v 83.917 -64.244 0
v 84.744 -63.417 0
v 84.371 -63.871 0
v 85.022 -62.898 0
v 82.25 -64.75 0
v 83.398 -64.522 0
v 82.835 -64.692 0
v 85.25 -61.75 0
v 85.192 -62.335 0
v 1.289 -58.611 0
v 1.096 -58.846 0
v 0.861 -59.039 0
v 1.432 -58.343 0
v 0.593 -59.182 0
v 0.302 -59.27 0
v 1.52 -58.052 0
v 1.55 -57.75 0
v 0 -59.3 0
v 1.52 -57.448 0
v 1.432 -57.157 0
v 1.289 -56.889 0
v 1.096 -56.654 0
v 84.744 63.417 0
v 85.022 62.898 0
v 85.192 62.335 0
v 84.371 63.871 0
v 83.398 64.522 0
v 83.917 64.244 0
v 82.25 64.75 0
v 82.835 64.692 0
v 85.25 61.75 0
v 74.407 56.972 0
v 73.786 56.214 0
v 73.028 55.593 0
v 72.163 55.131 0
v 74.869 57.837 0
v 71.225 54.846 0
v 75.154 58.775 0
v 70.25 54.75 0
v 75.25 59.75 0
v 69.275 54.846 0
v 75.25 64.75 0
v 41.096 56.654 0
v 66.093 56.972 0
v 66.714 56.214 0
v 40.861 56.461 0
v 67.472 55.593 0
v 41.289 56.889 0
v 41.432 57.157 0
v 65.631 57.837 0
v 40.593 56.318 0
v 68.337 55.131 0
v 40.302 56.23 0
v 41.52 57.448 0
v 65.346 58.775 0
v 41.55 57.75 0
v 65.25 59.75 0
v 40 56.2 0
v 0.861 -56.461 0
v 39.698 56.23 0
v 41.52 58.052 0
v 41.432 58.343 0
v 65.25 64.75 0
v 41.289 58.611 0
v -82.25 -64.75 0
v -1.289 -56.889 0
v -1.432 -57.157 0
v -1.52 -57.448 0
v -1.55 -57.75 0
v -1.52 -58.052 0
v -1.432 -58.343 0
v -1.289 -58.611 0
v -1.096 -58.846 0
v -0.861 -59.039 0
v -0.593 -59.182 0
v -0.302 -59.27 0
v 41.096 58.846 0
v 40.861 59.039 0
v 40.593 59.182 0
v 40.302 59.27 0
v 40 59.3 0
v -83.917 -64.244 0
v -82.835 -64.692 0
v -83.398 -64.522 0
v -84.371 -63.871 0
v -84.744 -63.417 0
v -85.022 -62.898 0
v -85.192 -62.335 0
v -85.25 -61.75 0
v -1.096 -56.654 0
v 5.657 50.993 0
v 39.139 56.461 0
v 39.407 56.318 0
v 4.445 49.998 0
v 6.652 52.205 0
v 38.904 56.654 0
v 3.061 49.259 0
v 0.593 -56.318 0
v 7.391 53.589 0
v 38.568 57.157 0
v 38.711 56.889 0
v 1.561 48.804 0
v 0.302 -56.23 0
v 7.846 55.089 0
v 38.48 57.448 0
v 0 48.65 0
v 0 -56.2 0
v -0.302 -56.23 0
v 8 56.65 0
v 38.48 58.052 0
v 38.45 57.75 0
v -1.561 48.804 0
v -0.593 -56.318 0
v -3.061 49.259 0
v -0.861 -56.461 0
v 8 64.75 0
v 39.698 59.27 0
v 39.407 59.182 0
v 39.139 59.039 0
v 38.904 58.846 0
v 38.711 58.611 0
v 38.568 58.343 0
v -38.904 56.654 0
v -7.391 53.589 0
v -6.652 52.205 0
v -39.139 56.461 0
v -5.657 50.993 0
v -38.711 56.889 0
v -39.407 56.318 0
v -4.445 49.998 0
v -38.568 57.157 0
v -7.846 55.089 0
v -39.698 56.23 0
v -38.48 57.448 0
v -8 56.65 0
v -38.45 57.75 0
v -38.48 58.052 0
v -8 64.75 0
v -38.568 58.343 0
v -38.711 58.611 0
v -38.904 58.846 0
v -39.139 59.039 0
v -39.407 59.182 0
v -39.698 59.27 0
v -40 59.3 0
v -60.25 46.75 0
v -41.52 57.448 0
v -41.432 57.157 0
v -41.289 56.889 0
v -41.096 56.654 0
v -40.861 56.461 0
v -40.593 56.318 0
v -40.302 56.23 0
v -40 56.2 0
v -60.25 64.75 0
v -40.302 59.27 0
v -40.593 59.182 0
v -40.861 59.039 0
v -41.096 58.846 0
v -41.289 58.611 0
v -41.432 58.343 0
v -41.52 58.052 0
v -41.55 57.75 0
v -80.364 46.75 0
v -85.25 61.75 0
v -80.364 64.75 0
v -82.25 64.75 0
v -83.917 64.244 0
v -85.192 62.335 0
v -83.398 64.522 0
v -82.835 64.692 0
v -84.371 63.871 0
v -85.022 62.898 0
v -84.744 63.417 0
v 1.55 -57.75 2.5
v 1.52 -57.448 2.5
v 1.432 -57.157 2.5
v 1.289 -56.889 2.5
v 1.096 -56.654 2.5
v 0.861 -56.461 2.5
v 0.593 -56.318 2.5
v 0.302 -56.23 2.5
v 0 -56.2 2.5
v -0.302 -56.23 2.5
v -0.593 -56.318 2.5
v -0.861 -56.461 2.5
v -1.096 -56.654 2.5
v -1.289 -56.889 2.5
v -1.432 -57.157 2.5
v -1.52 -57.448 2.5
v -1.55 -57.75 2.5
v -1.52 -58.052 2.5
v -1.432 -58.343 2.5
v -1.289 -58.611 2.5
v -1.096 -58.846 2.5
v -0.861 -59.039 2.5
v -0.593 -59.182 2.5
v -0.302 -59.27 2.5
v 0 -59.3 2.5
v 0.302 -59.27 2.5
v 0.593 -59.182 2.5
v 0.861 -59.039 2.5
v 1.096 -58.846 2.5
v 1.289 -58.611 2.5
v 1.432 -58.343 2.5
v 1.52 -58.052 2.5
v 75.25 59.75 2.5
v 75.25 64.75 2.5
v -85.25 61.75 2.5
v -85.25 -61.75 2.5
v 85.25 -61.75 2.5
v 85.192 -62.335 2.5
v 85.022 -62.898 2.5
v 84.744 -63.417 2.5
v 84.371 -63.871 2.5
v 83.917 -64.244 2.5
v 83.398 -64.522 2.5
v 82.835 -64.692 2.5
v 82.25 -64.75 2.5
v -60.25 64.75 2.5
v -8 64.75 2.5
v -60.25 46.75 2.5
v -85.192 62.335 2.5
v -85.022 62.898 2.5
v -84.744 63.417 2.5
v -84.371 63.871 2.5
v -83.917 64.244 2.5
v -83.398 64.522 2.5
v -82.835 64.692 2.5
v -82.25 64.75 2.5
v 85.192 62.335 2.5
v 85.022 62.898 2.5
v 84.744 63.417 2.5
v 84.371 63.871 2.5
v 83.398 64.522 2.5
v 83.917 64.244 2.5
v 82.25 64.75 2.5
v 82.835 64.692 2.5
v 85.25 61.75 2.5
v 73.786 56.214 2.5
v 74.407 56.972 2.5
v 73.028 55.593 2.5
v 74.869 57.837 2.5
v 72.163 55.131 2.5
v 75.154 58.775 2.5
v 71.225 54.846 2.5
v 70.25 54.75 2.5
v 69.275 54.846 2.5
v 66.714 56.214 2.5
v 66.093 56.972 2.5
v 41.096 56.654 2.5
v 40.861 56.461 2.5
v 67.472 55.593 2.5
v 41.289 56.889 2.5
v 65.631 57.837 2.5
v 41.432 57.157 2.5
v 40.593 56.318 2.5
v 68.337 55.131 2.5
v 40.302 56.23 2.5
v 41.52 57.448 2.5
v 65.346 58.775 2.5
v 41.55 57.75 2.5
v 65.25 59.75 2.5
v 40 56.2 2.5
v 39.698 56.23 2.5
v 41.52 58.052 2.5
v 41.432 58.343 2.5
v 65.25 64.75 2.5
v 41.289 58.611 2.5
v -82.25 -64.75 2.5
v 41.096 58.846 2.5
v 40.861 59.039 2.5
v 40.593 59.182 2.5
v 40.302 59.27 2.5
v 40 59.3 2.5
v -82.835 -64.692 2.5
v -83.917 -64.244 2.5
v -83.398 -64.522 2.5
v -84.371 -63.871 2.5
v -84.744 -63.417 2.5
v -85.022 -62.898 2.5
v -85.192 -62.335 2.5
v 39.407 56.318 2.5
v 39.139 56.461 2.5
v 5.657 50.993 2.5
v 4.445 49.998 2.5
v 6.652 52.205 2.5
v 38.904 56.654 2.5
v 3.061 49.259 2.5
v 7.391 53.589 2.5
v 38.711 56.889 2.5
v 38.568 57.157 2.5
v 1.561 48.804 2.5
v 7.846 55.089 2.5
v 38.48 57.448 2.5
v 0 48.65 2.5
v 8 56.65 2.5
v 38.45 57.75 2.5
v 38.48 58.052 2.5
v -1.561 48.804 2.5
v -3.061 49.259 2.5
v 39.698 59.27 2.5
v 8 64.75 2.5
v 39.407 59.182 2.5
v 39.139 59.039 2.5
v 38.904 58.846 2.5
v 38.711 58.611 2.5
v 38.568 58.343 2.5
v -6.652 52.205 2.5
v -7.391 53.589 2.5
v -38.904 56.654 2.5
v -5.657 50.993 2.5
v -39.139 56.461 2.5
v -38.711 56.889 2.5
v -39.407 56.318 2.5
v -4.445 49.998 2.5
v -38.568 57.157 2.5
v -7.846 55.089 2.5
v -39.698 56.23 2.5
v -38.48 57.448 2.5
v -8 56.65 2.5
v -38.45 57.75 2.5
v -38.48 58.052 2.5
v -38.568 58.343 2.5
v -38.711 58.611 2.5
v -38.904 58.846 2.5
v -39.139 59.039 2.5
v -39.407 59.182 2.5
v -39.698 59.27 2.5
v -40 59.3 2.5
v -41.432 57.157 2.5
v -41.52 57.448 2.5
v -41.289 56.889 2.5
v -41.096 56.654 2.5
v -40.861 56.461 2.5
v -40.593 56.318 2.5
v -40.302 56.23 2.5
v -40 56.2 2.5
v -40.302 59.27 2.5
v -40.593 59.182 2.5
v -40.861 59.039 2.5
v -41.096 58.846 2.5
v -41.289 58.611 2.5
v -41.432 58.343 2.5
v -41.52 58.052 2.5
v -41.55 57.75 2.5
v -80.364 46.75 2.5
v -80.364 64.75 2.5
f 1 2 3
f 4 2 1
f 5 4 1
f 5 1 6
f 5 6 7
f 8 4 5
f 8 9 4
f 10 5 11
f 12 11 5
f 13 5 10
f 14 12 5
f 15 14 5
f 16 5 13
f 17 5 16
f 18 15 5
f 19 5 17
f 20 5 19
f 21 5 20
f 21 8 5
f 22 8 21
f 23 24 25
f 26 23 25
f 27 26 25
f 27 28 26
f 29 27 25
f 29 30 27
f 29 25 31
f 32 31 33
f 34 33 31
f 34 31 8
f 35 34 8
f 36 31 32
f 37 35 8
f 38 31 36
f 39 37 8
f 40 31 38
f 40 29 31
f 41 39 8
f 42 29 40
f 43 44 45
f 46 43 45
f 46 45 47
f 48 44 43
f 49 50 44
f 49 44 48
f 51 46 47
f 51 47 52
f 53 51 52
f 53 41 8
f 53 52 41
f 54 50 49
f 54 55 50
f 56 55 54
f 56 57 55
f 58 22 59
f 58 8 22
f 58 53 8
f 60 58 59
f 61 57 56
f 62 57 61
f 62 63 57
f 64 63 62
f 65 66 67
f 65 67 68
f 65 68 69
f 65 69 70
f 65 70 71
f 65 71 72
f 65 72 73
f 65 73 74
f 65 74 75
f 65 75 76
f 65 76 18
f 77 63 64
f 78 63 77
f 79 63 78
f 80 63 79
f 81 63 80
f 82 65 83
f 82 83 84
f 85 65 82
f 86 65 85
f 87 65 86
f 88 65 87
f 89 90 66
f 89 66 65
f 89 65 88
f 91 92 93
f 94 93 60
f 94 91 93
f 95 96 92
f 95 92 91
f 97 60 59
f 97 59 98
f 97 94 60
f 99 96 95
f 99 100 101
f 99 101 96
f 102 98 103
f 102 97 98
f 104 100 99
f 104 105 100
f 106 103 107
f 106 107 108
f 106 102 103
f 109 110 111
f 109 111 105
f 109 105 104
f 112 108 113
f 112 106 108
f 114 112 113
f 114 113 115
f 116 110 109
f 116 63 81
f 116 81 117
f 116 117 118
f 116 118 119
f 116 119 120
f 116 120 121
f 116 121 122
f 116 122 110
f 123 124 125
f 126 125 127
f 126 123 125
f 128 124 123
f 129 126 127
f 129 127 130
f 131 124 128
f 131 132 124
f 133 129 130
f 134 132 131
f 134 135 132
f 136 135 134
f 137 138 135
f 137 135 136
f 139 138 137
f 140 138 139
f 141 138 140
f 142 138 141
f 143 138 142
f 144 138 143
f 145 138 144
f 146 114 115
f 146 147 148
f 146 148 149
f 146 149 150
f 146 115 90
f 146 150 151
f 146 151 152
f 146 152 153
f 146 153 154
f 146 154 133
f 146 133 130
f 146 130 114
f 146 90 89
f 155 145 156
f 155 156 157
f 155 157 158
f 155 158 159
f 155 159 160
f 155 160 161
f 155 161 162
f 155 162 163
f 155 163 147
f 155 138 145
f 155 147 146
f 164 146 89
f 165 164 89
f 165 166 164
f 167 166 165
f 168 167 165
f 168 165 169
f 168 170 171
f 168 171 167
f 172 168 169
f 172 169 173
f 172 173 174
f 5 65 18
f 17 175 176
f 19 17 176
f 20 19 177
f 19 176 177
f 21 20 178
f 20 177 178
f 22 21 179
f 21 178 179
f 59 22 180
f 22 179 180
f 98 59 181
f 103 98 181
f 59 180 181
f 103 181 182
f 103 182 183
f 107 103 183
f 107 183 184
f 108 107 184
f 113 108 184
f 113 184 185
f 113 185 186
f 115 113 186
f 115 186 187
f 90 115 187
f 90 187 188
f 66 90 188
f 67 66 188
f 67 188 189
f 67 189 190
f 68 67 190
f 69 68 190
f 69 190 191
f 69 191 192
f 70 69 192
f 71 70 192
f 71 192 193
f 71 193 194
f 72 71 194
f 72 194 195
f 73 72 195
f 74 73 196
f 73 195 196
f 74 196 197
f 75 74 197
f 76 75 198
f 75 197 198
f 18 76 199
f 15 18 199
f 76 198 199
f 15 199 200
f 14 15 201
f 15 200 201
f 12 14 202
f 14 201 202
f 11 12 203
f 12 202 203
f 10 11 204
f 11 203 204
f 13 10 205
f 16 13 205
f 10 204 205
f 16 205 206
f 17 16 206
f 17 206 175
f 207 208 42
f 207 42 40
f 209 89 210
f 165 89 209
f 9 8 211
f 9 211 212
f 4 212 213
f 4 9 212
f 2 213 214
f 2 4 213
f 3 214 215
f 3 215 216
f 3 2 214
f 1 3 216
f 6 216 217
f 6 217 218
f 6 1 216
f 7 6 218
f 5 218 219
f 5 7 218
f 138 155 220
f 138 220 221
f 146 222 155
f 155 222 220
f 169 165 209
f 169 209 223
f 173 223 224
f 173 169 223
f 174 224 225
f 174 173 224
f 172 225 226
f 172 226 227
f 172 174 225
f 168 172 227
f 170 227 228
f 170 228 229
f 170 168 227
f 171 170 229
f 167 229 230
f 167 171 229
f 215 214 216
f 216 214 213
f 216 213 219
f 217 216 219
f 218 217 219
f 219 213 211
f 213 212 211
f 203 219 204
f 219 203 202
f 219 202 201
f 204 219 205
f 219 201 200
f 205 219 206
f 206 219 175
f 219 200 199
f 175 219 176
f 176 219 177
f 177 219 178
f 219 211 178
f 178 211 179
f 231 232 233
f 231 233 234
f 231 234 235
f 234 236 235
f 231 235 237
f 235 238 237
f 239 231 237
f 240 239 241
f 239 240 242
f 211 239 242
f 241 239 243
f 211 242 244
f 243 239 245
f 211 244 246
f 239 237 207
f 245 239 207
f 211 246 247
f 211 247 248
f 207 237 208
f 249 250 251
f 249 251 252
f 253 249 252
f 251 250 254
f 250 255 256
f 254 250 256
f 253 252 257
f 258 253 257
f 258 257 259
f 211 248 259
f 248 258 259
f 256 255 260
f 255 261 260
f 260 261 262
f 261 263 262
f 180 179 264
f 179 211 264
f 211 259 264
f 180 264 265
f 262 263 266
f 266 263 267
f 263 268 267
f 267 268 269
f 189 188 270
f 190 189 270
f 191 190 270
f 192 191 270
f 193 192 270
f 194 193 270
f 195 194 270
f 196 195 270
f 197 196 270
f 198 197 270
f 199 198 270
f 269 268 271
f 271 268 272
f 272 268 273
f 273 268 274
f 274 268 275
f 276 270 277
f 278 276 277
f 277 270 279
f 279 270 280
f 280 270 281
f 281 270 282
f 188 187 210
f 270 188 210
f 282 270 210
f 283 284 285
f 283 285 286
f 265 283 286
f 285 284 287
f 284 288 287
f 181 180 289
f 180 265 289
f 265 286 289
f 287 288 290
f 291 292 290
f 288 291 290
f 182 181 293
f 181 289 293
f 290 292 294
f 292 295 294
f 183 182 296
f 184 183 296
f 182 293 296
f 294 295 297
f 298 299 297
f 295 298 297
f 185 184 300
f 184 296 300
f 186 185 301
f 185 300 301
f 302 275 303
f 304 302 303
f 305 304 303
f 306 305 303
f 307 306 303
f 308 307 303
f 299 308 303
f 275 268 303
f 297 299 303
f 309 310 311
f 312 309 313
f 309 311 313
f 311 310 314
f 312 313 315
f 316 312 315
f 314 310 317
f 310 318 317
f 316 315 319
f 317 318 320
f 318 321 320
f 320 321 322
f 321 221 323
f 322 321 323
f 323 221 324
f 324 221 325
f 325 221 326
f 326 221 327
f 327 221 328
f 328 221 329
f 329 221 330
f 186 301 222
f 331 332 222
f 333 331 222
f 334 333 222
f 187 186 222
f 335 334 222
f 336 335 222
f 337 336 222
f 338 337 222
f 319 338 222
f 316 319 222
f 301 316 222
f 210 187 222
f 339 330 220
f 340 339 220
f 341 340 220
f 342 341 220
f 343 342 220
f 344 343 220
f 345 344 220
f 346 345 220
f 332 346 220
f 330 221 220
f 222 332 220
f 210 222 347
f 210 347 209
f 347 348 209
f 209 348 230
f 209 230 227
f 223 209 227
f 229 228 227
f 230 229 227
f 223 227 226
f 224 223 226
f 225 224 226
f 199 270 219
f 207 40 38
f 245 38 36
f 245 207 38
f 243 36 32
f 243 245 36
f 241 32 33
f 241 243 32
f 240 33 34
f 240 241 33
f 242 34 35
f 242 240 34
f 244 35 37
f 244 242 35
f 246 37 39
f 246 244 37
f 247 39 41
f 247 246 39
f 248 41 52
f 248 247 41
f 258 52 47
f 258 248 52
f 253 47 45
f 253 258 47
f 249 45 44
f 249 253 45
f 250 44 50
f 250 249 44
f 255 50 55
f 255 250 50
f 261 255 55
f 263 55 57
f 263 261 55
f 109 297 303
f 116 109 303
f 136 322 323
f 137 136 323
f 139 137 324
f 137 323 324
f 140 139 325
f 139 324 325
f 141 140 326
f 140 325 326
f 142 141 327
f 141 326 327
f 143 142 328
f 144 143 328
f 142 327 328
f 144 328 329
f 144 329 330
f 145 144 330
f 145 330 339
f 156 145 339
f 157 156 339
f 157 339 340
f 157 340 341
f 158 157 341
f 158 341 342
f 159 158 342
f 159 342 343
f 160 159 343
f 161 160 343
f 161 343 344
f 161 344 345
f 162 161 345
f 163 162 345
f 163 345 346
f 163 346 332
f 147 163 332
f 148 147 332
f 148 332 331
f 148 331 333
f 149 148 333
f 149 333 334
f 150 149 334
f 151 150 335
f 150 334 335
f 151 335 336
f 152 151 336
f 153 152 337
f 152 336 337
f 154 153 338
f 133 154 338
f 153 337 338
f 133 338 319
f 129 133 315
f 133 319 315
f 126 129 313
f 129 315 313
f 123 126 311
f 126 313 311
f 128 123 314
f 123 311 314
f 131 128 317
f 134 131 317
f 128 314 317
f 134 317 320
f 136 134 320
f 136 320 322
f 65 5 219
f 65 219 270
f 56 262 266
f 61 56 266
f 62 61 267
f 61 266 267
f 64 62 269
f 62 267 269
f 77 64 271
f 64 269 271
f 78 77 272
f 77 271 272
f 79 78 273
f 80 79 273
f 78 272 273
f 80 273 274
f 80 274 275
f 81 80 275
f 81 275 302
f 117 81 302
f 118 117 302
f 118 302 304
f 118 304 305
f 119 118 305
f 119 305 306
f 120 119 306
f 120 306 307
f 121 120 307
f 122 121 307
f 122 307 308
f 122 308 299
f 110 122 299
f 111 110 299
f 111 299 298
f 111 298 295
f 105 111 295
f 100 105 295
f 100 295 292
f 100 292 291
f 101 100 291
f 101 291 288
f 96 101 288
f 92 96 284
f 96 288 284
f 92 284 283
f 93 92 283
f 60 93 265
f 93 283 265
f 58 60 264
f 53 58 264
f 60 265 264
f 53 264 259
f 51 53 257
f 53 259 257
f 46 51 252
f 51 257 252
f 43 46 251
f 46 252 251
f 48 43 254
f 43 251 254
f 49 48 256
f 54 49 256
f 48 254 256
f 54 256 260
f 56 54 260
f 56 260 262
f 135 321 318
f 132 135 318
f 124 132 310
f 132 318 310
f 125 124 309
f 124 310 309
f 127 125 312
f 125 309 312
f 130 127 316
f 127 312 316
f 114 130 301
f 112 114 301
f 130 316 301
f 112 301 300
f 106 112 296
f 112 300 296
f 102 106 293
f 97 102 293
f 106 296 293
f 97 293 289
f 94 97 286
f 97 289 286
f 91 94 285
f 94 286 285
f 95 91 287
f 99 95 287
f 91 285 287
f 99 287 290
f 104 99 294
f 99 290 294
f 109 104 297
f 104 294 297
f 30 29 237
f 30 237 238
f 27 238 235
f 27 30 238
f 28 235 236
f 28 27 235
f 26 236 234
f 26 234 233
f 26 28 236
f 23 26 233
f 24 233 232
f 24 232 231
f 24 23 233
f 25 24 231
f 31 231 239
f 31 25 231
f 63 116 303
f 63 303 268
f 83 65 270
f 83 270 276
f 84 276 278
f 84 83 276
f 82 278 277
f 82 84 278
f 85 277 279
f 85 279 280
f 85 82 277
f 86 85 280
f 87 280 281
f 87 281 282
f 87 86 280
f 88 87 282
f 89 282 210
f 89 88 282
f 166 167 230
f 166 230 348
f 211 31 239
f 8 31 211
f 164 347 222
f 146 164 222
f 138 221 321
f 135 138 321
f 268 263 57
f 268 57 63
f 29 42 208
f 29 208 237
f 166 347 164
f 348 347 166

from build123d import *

# Parameters (mm, degrees)
RESSALTO_EXTRUS_O1_DEPTH = 2.5
ESBO_O2_R                = 1.55
ESBO_O2_W                = 20.114167529
ESBO_O2_H                = 18
CORTE_EXTRUS_O1_DEPTH    = 3.5


with BuildPart() as part:
    # Esboço1 → Ressalto-extrusão1 (new body)
    with BuildSketch(Plane.XY):
        with BuildLine():
            Line((-82.25, 64.75), (82.25, 64.75))
            ThreePointArc((82.25, 64.75), (84.371320344, 63.871320344), (85.25, 61.75))
            Line((85.25, 61.75), (85.25, -61.75))
            ThreePointArc((85.25, -61.75), (84.371320344, -63.871320344), (82.25, -64.75))
            Line((82.25, -64.75), (-82.25, -64.75))
            ThreePointArc((-82.25, -64.75), (-84.371320344, -63.871320344), (-85.25, -61.75))
            Line((-85.25, -61.75), (-85.25, 61.75))
            ThreePointArc((-85.25, 61.75), (-84.371320344, 63.871320344), (-82.25, 64.75))
        make_face()
    extrude(amount=RESSALTO_EXTRUS_O1_DEPTH)

    # Esboço2 → Corte-extrusão1 (cut, through all)
    with BuildSketch(Plane.XY.offset(2.5)):
        with Locations((0, -57.75)):
            Circle(ESBO_O2_R)
        with Locations((-40, 57.75)):
            Circle(ESBO_O2_R)
        with Locations((40, 57.75)):
            Circle(ESBO_O2_R)
        with BuildLine():
            Line((8, 56.65), (8, 64.75))
            Line((8, 64.75), (-8, 64.75))
            Line((-8, 64.75), (-8, 56.65))
            ThreePointArc((-8, 56.65), (0, 48.65), (8, 56.65))
        make_face()
        with Locations((-70.307083765, 55.75)):
            Rectangle(ESBO_O2_W, ESBO_O2_H)
        with BuildLine():
            Line((65.25, 64.75), (75.25, 64.75))
            Line((75.25, 64.75), (75.25, 59.75))
            ThreePointArc((75.25, 59.75), (70.25, 54.75), (65.25, 59.75))
            Line((65.25, 59.75), (65.25, 64.75))
        make_face()
    extrude(amount=-CORTE_EXTRUS_O1_DEPTH, mode=Mode.SUBTRACT)


solid = part.part
